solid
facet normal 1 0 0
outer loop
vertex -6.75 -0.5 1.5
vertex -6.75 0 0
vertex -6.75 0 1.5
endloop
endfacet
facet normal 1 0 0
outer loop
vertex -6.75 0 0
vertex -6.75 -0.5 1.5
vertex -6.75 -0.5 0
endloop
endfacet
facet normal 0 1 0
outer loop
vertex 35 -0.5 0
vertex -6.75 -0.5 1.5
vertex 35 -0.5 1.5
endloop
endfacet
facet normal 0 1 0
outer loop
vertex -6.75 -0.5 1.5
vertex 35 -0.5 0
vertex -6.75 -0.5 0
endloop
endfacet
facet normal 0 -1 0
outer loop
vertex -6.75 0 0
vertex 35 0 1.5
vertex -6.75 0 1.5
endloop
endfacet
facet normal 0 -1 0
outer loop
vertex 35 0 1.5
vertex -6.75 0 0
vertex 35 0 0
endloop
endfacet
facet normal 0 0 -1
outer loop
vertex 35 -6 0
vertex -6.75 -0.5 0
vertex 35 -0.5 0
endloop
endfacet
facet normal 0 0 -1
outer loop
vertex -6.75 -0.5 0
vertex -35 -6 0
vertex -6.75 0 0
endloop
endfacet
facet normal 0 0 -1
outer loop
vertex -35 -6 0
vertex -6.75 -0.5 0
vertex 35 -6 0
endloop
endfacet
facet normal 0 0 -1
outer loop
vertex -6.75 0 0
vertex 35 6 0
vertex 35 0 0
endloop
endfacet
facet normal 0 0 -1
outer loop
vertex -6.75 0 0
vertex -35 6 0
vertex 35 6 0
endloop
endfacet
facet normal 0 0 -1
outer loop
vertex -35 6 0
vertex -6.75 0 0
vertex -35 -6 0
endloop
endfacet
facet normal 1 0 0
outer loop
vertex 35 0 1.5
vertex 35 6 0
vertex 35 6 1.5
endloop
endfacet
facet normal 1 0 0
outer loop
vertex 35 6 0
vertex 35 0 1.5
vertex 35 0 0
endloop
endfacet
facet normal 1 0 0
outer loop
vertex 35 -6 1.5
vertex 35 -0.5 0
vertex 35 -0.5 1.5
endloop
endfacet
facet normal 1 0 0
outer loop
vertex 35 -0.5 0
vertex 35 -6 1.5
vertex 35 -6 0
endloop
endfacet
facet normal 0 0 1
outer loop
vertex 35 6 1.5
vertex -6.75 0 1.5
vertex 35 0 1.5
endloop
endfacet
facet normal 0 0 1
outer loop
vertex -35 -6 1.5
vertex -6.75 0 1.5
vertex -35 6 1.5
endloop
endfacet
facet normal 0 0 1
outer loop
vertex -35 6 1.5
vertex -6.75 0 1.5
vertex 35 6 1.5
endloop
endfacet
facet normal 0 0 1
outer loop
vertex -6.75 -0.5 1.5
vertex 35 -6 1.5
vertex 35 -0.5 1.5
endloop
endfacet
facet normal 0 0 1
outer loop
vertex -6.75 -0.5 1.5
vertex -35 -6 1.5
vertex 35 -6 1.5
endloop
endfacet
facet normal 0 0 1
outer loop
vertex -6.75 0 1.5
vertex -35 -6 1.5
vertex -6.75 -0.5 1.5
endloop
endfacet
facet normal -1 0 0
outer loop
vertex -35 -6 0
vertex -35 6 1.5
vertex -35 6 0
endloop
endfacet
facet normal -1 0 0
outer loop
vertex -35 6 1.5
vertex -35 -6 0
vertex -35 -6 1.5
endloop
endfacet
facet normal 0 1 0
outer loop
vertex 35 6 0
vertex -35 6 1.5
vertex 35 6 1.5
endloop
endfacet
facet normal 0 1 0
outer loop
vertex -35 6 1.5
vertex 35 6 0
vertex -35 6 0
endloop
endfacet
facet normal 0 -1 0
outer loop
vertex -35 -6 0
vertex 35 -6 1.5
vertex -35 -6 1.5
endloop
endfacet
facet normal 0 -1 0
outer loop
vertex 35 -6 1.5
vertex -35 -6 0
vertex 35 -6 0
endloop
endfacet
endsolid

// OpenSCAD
// 10-well comb for casting agarose gels
// Print orientation: flat on bed, teeth pointing down (-Z)

// ---- Parameters ----
plate_len    = 70;    // spine length (X)
plate_wid    = 12;    // spine width (Y)
plate_thk    = 1.5;   // plate thickness (Z)
tooth_count  = 10;    // number of wells
tooth_w      = 5.0;   // tooth width (X)
tooth_len    = 12;    // tooth length (Y)
gap          = 1.5;   // tooth gap (X)
eps          = 0.5;   // cutter overshoot

$fn = 64;

// ---- Derived ----
pitch   = tooth_w + gap;
x_start = -(tooth_count - 1) * gap / 2;

// ---- Model ----
difference() {
    translate([-plate_len/2, -plate_wid/2, 0])
        cube([plate_len, plate_wid, plate_thk]);
    for (i = [0 : tooth_count - 1])
        translate([x_start + i * pitch, 0, 0])
            rotate([90, 0, 0])
                cube([tooth_len, tooth_w, eps]);
}
